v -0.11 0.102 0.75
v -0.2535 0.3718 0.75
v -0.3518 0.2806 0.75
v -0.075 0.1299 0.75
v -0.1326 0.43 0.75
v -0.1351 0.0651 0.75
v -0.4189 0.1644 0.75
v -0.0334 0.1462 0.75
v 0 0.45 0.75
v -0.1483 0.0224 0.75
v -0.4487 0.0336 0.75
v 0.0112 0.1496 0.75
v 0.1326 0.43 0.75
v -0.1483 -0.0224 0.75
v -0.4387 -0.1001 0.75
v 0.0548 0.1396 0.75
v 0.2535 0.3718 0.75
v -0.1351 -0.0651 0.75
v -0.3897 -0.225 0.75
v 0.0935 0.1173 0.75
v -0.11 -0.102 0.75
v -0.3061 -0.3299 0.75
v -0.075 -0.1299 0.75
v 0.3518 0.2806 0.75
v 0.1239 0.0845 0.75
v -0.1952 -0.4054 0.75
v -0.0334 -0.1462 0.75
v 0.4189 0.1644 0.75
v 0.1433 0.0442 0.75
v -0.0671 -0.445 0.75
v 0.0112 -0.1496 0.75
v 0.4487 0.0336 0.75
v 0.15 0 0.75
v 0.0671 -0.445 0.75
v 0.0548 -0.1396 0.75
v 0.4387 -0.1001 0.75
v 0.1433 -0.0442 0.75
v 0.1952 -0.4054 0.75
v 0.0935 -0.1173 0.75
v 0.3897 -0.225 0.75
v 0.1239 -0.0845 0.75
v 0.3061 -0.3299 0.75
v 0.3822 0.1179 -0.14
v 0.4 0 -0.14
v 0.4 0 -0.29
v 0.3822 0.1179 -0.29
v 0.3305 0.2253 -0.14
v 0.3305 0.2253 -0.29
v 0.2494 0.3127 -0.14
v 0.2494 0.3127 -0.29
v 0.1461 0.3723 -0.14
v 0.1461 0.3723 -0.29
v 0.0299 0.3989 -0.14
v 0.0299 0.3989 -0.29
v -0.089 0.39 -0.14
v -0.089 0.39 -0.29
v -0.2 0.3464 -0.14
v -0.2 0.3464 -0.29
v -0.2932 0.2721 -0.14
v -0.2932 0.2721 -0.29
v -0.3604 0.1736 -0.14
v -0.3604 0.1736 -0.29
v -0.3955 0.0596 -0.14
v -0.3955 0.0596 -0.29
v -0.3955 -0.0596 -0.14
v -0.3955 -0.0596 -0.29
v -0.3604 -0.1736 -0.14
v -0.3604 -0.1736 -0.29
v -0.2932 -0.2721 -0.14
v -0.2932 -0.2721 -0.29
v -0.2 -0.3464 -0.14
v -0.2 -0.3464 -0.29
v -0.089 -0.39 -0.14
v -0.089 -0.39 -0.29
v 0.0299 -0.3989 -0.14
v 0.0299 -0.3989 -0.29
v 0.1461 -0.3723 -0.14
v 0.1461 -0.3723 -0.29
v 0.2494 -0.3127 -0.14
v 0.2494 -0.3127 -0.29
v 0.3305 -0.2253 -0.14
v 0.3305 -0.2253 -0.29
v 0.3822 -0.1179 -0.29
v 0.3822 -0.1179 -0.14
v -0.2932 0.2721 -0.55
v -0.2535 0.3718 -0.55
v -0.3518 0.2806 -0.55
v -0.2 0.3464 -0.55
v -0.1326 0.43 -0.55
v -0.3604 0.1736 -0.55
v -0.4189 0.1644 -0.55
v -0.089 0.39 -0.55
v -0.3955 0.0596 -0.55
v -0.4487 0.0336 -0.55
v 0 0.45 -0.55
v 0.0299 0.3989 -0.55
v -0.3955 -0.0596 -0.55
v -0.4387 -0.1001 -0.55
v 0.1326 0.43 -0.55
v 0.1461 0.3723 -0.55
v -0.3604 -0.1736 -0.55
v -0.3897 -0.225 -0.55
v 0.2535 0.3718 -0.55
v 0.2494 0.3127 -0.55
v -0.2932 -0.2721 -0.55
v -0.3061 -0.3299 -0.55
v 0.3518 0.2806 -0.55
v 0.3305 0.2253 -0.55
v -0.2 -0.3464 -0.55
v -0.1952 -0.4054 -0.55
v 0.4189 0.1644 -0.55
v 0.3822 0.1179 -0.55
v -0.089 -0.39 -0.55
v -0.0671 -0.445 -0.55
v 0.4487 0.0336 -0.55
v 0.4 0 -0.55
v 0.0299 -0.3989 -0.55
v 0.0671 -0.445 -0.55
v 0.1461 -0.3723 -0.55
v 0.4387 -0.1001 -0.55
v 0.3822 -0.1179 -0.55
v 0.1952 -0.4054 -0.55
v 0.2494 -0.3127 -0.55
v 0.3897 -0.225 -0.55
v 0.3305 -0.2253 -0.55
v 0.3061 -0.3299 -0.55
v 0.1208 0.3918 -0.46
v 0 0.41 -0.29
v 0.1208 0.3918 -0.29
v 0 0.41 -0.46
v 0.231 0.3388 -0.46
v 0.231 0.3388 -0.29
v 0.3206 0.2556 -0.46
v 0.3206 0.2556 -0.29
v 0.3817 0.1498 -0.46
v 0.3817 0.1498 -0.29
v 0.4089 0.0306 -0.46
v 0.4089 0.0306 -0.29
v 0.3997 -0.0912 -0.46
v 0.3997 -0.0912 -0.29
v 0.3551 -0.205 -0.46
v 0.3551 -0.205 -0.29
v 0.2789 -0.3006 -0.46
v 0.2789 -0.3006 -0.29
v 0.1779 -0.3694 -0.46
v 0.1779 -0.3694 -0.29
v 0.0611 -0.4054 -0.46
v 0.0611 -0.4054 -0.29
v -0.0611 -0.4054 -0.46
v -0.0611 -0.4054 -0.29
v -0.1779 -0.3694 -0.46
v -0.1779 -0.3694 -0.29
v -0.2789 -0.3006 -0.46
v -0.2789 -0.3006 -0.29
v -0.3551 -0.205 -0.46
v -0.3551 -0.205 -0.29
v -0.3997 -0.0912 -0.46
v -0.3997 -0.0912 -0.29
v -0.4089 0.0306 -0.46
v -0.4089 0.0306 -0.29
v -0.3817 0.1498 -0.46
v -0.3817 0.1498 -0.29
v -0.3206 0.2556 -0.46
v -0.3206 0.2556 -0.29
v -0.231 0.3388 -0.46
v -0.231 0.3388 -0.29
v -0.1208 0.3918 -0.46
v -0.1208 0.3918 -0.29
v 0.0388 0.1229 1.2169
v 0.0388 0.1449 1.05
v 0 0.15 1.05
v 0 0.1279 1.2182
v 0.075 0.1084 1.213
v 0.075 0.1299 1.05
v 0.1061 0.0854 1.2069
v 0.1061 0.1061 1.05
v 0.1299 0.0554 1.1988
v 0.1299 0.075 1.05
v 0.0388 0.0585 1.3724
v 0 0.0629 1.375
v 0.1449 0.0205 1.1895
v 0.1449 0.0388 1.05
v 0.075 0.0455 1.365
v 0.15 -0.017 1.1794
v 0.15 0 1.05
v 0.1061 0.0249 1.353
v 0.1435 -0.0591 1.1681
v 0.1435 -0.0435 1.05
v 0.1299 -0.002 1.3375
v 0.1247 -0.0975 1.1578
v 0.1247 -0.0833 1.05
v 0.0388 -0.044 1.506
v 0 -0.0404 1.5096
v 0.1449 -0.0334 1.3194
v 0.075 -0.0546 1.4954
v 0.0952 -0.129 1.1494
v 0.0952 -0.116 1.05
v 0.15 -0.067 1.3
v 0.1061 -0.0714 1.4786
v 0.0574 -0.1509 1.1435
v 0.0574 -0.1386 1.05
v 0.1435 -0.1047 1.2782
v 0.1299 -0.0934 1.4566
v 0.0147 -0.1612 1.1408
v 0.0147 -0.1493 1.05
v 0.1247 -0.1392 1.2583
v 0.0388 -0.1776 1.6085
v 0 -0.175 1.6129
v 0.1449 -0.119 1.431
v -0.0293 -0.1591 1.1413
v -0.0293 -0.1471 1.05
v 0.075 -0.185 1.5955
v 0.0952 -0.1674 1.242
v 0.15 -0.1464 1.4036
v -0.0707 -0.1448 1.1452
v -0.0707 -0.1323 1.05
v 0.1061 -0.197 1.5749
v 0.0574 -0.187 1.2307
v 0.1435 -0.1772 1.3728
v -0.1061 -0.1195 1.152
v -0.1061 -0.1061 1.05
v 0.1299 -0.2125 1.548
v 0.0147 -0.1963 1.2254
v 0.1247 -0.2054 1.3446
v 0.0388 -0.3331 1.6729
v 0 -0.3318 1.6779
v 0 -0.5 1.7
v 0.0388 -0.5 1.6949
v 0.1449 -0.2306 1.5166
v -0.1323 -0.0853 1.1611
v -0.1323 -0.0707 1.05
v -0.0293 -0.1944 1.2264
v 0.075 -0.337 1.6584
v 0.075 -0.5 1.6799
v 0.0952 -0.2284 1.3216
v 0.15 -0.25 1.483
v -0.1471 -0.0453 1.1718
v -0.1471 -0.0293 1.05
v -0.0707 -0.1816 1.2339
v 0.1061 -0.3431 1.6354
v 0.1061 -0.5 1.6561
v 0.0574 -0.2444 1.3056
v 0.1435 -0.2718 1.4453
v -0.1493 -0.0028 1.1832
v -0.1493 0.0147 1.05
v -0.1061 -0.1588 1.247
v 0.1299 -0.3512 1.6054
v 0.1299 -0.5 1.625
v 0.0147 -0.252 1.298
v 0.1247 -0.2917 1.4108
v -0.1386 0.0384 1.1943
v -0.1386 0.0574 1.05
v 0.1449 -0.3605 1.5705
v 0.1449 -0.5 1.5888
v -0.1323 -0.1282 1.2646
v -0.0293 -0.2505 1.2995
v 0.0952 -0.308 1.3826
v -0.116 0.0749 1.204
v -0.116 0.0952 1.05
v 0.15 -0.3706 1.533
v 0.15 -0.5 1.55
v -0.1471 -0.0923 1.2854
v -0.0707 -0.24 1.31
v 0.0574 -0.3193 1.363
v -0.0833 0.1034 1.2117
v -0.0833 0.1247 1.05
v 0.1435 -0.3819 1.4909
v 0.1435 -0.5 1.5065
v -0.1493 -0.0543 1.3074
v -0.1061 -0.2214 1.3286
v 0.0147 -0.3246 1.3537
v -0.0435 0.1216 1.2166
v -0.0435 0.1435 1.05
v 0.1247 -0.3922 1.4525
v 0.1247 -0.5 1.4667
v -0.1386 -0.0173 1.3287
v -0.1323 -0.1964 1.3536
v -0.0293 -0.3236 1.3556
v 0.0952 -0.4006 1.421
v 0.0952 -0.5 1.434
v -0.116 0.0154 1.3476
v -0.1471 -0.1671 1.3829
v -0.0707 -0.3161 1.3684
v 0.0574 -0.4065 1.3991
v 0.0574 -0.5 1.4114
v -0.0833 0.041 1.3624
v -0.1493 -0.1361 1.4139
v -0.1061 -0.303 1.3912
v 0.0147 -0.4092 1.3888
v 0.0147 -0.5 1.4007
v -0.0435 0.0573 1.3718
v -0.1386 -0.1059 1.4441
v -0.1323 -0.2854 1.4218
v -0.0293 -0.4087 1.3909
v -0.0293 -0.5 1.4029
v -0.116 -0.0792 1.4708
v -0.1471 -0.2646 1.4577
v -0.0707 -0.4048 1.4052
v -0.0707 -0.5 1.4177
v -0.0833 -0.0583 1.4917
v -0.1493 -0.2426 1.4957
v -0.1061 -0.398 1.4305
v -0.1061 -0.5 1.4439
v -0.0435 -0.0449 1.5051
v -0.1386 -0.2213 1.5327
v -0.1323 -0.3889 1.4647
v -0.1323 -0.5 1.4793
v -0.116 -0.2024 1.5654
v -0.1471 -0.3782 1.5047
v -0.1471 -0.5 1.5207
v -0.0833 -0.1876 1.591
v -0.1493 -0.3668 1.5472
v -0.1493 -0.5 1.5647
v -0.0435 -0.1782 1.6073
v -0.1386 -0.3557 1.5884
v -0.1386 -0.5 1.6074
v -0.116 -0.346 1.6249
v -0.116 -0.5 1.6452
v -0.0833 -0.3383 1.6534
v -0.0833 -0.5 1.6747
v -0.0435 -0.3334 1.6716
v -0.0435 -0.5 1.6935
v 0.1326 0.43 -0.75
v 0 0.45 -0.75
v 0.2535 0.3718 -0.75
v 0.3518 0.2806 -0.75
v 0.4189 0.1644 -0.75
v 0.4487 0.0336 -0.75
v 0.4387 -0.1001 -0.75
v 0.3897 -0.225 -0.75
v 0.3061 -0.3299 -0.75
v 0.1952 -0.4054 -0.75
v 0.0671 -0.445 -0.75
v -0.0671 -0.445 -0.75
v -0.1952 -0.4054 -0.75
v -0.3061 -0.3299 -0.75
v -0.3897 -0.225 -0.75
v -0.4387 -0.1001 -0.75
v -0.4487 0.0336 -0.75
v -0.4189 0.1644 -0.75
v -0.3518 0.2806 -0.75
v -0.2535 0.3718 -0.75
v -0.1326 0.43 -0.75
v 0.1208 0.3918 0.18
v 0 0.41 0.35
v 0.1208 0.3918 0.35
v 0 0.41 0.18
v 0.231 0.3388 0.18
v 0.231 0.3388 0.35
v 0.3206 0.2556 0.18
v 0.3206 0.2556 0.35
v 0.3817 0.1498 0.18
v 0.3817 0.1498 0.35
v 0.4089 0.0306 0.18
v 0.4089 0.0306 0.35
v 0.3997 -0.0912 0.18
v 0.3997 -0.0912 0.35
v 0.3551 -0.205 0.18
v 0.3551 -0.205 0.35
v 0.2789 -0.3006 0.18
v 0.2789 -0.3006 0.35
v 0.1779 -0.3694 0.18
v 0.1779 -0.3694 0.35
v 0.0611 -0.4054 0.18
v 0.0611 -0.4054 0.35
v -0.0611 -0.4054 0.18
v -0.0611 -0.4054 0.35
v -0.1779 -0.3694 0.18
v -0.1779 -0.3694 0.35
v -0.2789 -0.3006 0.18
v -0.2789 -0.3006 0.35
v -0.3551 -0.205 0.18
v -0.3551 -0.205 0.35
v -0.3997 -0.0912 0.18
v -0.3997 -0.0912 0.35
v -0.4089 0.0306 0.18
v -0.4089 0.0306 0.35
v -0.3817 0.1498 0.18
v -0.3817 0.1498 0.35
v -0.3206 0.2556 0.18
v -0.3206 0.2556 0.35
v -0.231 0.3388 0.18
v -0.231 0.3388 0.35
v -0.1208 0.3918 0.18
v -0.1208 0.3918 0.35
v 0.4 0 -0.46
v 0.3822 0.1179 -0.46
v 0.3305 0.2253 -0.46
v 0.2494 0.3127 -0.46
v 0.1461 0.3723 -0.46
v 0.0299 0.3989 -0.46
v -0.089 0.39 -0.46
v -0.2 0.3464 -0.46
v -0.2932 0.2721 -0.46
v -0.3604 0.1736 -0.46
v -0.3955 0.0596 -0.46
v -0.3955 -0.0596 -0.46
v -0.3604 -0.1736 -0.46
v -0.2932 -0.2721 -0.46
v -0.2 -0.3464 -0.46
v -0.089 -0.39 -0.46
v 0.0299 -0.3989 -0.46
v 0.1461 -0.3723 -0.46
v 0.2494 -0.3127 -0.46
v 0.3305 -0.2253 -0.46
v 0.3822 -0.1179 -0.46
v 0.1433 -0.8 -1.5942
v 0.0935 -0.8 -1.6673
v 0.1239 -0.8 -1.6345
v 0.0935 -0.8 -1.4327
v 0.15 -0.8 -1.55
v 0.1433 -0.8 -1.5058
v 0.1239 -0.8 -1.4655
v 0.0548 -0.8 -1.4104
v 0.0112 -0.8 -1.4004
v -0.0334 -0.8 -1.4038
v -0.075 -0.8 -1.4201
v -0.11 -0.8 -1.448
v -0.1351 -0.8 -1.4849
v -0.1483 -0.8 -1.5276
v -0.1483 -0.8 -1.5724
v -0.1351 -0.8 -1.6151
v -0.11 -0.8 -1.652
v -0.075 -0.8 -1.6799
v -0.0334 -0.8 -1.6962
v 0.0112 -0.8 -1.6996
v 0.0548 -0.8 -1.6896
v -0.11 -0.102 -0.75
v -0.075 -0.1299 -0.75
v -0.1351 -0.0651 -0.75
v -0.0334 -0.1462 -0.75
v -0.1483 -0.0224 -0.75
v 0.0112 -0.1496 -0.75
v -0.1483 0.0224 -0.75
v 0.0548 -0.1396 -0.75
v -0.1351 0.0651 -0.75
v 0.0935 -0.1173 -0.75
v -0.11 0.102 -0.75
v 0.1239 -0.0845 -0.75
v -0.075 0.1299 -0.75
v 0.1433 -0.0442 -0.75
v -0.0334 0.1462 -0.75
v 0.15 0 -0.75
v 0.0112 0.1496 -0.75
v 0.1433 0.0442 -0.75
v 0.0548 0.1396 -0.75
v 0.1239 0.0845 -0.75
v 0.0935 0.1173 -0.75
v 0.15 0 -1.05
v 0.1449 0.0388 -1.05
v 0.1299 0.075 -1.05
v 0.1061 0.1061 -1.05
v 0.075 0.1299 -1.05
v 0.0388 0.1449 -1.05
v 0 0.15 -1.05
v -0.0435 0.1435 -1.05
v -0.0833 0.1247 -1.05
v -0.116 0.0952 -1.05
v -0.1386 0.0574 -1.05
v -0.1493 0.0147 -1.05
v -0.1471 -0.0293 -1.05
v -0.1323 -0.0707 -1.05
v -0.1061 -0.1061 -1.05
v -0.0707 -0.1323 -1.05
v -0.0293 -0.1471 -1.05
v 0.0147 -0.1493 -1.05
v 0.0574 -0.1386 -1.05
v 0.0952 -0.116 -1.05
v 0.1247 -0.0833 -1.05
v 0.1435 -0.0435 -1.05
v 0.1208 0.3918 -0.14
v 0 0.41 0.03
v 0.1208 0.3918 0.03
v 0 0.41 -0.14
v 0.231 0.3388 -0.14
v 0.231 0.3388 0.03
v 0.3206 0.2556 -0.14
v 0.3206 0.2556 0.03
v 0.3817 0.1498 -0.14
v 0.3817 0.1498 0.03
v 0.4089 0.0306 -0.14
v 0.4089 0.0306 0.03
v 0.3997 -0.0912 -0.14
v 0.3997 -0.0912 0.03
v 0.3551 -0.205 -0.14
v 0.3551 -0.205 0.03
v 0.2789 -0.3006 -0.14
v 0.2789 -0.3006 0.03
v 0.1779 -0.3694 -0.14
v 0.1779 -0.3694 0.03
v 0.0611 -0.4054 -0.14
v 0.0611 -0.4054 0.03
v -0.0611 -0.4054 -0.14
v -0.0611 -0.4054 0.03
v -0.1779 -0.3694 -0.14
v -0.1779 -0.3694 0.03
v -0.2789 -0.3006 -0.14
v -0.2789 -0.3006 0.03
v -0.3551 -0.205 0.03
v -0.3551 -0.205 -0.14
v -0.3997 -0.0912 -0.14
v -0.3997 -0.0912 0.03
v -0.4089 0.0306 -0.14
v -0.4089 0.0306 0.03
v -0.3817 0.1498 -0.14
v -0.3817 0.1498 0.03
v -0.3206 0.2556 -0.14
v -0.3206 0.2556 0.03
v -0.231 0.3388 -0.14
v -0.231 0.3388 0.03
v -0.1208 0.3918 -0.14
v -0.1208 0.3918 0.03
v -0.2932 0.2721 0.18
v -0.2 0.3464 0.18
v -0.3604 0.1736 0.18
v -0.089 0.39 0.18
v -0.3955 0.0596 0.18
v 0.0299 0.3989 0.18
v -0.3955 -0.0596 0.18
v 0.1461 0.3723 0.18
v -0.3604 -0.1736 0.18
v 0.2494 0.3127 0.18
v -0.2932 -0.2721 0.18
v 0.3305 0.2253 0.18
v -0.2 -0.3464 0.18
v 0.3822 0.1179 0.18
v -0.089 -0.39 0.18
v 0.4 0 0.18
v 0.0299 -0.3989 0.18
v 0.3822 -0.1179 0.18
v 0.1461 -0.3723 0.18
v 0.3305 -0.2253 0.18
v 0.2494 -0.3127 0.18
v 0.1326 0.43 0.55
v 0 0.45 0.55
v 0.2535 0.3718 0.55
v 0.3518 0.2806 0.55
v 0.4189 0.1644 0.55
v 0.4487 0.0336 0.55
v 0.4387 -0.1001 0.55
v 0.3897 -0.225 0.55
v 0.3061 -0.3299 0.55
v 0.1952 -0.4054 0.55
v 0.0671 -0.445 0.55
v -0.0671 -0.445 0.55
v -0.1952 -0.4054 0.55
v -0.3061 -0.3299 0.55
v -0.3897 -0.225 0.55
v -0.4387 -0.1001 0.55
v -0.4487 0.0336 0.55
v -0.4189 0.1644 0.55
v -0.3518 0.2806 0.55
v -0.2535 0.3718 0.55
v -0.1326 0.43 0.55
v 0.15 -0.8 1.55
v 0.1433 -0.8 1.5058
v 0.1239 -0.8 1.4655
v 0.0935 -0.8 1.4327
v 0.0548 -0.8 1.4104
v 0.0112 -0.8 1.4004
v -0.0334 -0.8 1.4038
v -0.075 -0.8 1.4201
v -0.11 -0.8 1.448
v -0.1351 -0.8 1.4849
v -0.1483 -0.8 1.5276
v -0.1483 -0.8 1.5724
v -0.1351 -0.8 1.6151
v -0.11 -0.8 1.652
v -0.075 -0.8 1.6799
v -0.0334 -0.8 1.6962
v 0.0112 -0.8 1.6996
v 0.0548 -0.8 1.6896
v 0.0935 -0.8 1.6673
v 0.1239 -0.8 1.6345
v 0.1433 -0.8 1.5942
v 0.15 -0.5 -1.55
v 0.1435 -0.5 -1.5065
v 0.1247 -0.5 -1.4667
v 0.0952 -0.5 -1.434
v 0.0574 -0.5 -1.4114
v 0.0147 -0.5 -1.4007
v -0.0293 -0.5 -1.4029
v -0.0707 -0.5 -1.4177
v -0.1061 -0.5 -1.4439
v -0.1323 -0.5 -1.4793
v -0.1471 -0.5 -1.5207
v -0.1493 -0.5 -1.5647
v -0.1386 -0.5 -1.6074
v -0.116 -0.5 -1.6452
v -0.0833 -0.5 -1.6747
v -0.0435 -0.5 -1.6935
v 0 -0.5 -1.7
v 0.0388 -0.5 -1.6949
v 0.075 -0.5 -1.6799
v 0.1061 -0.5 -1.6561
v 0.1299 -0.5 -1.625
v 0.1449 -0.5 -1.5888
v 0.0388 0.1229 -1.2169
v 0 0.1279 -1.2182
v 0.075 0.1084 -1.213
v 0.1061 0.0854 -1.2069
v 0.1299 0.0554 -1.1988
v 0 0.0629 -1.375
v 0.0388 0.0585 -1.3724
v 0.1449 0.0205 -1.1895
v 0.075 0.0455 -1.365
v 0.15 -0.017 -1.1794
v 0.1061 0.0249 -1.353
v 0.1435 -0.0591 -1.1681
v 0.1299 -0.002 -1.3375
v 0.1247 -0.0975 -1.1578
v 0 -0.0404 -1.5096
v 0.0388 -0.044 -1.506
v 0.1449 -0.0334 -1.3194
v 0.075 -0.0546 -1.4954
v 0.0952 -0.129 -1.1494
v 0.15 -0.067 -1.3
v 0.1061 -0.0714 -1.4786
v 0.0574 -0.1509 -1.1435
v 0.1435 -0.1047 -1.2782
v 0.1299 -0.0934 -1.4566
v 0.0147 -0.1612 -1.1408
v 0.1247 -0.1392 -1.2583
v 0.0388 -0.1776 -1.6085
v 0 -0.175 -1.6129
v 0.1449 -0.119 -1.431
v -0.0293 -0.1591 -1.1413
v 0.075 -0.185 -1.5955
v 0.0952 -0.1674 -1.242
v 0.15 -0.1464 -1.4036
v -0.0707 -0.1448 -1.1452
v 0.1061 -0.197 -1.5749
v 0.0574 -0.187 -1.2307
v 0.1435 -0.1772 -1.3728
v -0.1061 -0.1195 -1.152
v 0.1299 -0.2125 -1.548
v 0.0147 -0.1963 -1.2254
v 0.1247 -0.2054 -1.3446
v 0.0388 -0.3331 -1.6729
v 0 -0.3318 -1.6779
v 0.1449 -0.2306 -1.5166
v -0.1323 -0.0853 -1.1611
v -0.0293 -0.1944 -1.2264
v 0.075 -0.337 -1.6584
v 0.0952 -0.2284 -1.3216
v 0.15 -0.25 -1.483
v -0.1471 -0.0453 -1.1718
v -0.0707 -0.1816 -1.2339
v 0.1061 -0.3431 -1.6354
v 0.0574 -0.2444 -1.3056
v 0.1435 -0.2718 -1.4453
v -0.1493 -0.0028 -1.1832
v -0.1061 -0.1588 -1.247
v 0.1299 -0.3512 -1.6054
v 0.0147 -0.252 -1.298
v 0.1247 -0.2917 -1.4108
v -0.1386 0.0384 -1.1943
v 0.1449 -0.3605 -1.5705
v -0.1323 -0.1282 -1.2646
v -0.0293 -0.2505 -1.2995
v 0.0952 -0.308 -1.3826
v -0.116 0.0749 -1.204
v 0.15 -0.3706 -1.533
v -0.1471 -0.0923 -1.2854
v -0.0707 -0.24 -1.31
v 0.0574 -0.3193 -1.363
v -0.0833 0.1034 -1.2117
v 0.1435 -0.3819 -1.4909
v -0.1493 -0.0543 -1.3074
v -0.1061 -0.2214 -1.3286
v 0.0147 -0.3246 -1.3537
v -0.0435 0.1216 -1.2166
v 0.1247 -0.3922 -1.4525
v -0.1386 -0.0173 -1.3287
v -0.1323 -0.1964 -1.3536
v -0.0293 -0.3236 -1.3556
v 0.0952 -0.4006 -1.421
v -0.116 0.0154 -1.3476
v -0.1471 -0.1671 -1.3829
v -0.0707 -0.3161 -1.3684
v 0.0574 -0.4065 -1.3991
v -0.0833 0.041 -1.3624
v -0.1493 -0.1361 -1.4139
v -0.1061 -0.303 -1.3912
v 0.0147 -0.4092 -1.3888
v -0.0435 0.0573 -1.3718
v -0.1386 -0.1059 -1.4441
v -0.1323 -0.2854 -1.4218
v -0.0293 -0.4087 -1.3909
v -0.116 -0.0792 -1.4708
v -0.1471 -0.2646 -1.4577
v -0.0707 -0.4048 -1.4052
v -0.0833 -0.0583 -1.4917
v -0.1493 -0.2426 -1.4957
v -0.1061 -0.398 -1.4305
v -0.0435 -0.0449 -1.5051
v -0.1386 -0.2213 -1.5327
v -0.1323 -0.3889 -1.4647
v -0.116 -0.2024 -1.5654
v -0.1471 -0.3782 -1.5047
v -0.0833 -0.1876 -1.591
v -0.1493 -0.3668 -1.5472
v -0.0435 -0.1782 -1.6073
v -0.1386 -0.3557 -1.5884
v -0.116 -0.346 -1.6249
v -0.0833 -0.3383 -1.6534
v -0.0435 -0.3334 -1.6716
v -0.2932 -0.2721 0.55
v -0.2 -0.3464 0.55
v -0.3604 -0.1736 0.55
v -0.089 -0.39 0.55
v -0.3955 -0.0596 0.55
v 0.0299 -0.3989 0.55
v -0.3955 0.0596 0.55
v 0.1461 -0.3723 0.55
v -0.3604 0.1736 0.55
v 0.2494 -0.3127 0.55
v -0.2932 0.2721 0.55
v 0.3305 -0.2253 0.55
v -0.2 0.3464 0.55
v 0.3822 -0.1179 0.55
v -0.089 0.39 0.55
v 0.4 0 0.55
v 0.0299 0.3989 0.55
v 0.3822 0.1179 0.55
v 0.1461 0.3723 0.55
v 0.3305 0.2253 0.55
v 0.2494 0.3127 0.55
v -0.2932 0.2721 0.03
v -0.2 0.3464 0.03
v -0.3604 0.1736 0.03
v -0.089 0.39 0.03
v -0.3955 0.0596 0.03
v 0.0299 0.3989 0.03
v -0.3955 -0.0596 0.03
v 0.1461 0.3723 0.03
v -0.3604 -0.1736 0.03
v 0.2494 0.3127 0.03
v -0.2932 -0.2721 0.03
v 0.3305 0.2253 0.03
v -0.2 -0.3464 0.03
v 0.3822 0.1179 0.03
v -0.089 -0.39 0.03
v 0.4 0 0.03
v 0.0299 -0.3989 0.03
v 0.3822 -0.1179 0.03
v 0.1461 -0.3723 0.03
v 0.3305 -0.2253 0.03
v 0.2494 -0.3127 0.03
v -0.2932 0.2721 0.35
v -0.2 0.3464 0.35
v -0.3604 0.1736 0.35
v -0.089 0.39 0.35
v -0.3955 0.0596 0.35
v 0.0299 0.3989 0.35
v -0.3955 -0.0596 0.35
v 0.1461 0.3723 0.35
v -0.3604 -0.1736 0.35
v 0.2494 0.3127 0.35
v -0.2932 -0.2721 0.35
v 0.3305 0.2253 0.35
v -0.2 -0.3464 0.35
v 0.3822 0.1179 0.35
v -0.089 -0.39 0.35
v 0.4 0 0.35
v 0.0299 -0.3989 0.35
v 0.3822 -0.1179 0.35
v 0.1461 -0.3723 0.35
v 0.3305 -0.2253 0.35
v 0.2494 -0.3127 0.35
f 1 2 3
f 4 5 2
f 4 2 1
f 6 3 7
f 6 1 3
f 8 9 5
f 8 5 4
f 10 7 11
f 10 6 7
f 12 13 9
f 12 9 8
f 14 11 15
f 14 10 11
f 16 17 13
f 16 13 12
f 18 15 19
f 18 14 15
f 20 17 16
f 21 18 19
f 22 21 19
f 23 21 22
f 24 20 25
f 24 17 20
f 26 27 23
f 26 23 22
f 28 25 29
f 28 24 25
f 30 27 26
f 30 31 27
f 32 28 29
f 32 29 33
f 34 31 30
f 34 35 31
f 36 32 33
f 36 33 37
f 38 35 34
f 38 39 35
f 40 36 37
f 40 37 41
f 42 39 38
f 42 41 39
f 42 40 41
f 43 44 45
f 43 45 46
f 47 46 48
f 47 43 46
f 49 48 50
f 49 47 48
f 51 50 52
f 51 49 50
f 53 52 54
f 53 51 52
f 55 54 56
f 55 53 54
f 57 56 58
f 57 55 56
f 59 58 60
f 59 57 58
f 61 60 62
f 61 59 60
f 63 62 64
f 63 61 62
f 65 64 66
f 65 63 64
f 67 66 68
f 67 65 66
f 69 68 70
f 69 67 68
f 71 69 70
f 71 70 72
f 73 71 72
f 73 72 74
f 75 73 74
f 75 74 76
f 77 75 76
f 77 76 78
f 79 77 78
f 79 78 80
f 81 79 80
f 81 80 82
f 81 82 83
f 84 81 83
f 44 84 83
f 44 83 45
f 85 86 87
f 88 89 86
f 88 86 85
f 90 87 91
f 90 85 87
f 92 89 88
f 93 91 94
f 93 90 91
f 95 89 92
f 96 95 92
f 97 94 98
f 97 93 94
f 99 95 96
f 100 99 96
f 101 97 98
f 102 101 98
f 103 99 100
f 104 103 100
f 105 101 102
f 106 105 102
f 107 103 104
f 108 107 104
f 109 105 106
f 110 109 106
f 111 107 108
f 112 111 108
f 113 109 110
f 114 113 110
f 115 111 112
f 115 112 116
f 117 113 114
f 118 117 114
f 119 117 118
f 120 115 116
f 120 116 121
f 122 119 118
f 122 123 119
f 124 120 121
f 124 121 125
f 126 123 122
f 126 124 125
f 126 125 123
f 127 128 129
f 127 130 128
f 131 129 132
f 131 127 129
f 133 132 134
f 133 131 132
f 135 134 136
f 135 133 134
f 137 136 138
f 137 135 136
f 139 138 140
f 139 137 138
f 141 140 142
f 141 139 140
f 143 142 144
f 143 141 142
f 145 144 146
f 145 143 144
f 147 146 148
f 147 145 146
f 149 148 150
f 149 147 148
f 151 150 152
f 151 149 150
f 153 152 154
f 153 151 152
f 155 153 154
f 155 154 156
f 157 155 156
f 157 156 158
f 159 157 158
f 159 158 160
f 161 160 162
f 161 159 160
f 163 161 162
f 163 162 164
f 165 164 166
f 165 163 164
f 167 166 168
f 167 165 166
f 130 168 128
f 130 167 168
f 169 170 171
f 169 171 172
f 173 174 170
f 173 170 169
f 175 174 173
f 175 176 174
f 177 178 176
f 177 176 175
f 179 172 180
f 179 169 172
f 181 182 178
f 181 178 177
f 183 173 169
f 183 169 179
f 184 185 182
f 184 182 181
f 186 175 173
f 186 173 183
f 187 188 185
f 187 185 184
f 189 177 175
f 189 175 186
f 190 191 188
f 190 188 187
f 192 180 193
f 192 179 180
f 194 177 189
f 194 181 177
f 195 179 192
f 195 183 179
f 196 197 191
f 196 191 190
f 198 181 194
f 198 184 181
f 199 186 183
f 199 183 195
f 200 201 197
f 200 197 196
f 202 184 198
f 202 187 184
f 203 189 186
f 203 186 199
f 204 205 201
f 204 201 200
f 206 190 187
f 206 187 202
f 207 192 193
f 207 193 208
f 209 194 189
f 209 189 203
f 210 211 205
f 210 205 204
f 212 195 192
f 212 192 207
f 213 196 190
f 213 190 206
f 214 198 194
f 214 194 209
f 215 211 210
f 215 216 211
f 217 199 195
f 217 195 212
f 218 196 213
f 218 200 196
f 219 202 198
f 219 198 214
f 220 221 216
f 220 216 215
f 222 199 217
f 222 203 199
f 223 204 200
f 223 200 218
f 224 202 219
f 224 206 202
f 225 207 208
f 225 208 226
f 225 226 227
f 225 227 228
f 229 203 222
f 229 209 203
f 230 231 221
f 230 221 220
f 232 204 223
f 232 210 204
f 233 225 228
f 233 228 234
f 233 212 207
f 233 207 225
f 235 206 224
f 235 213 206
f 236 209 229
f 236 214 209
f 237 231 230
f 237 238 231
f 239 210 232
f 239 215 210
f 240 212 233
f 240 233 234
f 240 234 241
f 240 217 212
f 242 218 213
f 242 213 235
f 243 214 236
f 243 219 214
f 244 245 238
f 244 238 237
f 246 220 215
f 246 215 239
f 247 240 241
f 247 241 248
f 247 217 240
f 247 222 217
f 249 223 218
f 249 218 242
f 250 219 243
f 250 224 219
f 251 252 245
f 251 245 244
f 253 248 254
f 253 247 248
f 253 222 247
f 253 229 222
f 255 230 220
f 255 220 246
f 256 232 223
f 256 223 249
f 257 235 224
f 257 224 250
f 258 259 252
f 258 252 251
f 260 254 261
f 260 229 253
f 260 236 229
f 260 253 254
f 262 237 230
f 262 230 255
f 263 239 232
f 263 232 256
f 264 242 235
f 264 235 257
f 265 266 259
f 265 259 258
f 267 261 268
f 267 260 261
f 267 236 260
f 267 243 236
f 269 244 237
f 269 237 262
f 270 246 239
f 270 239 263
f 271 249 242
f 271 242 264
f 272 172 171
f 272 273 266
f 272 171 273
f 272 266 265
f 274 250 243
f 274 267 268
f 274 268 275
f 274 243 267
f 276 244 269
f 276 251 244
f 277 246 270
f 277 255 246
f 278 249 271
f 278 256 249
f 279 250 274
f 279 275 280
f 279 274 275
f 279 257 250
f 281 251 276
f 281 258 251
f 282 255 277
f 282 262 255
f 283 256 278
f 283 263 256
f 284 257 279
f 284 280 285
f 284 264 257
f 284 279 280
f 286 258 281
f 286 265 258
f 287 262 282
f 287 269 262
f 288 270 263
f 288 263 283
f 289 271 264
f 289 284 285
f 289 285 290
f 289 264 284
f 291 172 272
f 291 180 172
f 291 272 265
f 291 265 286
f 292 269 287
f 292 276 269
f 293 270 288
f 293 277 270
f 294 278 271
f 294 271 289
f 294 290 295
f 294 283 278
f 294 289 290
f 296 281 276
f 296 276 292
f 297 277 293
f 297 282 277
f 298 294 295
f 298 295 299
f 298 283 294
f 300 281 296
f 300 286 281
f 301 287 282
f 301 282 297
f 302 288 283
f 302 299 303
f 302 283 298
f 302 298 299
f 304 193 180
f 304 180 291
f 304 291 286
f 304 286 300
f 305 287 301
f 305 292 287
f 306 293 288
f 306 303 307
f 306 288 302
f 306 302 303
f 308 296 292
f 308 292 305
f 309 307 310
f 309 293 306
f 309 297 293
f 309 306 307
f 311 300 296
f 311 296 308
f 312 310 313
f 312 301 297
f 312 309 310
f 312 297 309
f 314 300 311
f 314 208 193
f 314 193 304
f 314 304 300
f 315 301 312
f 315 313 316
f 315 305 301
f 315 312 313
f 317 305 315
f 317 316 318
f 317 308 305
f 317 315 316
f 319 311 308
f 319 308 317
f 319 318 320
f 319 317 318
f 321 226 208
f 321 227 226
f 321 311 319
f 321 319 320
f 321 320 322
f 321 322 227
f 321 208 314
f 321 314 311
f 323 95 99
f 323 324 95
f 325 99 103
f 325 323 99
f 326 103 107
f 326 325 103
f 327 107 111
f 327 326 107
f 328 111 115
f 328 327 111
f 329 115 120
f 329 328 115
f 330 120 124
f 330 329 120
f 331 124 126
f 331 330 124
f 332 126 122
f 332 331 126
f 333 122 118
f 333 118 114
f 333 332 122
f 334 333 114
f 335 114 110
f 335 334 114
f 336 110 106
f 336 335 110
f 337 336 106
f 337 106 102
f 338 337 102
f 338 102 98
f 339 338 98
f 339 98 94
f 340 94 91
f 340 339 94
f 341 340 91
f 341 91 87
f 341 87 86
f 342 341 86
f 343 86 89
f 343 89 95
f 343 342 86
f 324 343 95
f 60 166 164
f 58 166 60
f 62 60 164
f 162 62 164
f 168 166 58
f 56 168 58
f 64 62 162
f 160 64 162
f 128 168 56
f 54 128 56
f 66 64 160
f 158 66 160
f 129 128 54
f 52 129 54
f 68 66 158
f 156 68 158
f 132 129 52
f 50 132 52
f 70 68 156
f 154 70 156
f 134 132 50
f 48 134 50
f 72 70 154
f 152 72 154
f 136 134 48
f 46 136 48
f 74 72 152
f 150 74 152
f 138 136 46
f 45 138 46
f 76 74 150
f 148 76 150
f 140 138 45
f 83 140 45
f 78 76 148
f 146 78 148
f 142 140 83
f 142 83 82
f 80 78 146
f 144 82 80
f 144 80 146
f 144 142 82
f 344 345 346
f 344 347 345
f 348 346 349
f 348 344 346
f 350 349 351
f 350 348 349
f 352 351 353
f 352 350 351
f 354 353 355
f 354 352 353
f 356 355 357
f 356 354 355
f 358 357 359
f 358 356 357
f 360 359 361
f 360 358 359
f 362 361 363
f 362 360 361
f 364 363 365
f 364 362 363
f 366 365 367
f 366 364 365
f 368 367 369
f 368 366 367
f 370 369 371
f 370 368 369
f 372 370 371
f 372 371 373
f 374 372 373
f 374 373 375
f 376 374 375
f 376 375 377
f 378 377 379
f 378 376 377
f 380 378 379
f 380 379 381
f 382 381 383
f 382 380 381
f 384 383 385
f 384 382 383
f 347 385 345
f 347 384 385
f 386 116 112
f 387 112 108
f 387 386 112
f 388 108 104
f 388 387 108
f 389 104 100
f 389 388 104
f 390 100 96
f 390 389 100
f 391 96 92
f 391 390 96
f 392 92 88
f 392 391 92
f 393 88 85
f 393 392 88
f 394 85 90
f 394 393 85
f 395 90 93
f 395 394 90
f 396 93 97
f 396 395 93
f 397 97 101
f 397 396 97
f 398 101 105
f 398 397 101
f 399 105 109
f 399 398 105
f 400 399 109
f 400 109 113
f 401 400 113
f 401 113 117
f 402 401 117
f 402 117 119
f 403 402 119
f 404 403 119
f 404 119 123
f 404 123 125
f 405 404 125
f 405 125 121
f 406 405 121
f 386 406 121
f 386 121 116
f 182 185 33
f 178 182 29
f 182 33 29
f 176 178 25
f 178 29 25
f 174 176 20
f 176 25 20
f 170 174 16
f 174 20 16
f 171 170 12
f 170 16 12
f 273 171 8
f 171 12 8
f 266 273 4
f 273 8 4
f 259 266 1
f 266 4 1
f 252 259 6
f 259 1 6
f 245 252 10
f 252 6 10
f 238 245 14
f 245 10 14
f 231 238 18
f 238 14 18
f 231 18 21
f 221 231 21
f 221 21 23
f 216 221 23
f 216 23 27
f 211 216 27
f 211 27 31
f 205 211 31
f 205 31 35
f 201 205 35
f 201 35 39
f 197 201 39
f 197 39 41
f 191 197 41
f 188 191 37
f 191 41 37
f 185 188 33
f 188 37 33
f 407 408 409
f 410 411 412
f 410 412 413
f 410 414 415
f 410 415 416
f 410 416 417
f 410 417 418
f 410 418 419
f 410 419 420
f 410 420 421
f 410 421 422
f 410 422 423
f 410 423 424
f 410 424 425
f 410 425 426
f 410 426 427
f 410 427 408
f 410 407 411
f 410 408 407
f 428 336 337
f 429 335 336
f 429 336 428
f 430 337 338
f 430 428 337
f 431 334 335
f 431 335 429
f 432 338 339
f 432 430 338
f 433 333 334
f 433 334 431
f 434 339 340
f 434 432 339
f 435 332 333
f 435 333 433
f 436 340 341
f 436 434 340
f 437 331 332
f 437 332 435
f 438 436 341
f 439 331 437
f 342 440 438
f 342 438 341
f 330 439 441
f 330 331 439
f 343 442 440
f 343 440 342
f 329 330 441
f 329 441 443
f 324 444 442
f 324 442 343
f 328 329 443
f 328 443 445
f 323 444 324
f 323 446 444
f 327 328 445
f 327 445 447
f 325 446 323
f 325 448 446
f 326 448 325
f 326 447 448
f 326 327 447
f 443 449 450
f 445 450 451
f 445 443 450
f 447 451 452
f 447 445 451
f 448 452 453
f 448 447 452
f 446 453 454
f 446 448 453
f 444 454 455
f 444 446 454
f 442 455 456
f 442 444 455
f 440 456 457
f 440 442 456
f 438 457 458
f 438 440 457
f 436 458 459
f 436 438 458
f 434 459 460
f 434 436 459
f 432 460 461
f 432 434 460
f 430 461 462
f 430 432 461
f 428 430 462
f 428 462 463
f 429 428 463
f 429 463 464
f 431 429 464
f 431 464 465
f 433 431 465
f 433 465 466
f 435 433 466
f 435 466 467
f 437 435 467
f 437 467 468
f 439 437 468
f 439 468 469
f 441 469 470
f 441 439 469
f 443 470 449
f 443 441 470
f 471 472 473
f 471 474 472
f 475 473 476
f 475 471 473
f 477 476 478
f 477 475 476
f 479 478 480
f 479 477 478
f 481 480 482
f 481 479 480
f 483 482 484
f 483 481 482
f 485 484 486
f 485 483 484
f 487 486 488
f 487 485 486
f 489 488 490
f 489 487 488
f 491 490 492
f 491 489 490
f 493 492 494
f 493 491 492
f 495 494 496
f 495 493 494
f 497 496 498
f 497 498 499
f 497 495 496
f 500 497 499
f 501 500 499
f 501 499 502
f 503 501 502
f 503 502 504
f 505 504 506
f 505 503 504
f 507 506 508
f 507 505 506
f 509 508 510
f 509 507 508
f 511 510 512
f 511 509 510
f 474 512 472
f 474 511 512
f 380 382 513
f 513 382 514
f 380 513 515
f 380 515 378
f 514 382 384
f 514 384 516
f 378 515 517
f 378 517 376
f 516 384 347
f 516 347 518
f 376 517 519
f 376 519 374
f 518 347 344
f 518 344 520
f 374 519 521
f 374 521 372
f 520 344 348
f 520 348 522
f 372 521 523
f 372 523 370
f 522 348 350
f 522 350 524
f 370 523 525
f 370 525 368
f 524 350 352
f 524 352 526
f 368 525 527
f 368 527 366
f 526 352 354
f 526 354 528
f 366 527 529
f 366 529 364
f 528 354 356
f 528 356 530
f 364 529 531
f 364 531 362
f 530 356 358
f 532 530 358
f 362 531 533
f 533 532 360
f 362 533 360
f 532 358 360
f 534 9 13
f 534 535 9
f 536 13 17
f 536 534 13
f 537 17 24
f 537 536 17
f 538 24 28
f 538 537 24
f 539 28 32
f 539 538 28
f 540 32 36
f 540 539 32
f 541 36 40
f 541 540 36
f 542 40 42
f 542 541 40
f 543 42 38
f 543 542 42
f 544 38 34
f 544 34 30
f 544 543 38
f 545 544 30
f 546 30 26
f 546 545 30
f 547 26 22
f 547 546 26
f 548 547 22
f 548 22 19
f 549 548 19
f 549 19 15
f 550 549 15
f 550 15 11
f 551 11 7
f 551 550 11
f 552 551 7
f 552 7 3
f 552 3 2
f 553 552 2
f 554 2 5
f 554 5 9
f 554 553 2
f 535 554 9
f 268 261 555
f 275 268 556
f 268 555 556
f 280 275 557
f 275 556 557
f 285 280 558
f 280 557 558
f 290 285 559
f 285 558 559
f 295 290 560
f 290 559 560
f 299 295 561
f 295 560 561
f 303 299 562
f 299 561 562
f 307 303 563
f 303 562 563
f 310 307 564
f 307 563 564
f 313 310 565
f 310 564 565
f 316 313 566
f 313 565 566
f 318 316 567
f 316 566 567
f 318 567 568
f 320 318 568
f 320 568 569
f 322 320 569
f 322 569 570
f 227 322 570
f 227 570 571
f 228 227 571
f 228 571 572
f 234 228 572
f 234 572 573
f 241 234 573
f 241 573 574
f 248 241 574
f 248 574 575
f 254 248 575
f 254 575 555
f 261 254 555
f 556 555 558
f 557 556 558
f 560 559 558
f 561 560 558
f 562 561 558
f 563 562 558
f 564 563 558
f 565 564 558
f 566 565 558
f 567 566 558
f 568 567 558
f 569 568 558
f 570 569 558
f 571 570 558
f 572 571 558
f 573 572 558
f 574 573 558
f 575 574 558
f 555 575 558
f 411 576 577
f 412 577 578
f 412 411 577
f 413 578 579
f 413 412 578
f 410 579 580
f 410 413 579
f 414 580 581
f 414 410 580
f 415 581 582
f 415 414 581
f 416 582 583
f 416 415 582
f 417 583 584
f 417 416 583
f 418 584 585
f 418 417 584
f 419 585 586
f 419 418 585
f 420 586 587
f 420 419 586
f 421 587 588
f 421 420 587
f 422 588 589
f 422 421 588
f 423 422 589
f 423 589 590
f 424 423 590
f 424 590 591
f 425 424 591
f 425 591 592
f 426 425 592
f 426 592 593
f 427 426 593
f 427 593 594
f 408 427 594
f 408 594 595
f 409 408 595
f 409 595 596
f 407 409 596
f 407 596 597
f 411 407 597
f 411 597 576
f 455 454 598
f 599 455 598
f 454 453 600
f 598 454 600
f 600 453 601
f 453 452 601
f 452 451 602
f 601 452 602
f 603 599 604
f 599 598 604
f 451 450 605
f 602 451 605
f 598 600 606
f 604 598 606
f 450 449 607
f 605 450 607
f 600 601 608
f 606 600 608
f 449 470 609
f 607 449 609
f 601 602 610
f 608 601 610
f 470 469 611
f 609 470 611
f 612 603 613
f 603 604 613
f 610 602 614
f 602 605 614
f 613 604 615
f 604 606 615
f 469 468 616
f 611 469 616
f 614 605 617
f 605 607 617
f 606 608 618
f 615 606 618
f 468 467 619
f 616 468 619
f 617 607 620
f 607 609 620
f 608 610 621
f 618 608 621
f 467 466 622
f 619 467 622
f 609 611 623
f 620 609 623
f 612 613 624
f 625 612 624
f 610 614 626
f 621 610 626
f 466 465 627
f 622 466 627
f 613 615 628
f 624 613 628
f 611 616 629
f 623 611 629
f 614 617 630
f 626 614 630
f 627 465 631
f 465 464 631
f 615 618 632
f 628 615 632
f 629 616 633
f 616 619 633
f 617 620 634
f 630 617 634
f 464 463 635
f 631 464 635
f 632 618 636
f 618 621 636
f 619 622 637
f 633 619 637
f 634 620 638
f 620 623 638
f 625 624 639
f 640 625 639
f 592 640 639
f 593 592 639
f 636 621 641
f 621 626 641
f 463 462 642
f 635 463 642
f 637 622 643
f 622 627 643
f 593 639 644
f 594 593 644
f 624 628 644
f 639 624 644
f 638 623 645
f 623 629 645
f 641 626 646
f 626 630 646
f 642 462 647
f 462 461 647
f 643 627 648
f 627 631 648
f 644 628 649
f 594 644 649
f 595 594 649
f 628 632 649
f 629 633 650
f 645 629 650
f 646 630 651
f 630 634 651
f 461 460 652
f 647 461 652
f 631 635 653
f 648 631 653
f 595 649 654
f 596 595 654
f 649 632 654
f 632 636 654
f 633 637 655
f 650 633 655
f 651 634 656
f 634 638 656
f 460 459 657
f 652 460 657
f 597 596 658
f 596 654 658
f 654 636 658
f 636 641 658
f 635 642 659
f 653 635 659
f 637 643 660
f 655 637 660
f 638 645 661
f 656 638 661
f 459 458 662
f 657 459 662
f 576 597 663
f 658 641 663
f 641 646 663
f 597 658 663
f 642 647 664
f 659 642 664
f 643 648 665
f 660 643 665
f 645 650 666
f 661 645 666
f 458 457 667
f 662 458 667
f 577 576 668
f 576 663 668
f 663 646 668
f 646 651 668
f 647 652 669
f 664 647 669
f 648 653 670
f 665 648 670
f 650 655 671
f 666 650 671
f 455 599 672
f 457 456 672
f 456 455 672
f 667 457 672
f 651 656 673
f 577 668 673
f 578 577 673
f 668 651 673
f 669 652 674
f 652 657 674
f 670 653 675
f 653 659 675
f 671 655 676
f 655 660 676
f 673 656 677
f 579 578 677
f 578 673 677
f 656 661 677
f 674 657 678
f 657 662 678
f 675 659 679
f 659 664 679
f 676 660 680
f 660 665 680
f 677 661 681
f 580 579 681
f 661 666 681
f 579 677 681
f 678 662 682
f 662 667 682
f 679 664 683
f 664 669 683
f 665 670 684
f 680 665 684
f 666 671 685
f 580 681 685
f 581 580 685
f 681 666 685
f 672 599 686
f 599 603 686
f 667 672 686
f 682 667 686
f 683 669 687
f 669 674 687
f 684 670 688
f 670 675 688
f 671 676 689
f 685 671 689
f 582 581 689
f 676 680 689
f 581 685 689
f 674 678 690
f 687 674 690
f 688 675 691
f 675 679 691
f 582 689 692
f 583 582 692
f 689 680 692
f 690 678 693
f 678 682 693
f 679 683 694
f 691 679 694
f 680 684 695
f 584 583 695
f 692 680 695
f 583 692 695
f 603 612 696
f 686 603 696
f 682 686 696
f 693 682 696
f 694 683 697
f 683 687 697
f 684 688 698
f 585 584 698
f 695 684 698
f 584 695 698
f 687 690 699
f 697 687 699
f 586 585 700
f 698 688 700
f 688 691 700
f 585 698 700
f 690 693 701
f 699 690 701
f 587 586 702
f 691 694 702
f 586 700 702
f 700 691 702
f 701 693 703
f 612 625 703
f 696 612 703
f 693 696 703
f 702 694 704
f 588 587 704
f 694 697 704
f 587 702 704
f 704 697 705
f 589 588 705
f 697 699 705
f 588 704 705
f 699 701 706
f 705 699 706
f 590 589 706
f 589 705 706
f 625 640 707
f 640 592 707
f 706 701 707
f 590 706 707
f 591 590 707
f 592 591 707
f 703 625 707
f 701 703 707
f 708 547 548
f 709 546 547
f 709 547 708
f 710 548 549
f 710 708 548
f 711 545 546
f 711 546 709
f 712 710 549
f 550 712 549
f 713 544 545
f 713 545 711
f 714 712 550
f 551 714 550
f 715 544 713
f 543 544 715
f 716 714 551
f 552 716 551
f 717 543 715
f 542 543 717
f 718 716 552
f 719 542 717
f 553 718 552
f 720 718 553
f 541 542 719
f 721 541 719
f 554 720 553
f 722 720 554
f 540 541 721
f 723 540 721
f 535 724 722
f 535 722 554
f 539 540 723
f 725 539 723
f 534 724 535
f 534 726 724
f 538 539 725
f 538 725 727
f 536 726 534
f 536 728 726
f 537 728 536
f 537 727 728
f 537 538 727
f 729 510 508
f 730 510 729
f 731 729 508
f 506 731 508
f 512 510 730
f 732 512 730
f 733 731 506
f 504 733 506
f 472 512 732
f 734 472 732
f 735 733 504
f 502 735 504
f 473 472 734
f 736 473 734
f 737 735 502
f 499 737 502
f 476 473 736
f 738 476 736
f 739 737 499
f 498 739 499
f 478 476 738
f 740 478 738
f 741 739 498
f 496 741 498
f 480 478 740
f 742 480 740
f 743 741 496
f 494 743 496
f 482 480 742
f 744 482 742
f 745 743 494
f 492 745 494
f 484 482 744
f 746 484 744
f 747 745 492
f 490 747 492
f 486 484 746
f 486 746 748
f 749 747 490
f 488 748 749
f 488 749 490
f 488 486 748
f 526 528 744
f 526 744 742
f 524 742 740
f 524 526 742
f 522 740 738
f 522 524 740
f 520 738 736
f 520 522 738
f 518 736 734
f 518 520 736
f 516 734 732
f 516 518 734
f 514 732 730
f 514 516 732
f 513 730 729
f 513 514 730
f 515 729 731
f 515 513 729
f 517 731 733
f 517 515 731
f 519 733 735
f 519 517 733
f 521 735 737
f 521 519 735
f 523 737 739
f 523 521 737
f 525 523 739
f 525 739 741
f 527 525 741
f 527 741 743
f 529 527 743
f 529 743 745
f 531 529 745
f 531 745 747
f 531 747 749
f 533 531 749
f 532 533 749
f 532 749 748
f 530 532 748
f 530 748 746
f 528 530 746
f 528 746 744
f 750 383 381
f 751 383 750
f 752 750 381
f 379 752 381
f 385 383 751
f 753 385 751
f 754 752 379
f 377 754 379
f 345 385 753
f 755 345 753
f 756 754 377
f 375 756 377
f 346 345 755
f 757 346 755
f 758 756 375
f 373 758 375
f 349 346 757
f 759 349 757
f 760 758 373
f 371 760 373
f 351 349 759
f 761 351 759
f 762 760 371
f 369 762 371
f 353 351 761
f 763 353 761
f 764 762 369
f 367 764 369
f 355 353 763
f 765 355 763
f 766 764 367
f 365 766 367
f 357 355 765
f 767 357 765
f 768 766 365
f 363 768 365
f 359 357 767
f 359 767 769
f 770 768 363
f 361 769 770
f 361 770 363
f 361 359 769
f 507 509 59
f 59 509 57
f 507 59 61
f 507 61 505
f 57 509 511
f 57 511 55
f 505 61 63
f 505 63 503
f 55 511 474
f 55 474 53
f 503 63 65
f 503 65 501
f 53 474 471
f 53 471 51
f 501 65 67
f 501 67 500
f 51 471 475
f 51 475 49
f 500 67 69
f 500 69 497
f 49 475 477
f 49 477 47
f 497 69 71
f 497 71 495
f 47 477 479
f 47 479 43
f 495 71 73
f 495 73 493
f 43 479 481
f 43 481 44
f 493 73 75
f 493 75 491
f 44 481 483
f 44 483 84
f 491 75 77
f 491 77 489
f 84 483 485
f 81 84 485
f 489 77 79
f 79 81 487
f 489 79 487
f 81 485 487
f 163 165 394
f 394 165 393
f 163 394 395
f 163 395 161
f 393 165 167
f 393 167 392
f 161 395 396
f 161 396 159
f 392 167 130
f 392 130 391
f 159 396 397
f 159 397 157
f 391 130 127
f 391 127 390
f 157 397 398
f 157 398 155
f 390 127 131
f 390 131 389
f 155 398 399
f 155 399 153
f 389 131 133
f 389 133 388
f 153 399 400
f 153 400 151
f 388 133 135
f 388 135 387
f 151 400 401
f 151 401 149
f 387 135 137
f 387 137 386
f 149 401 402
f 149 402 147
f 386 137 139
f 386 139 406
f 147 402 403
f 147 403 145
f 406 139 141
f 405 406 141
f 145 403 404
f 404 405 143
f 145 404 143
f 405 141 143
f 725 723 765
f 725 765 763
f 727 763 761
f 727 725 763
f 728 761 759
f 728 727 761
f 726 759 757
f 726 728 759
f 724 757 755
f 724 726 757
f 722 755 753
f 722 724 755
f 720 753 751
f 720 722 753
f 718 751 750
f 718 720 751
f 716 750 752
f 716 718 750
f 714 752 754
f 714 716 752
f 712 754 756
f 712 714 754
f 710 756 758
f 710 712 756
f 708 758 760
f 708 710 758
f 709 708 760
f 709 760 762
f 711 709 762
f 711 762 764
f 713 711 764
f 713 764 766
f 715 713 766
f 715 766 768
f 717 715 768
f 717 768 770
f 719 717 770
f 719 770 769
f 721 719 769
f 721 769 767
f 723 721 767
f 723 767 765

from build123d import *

# Parameters (mm, degrees)
ESBO_O1_R                = 0.4
RESSALTO_EXTRUS_O1_DEPTH = 0.75
VARREDURA1_OUTLINE_R     = 0.15
VARREDURA1_ANGLE         = 90
VARREDURA1_2_OUTLINE_R   = 0.15
VARREDURA1_2_DEPTH       = 1.0500001
VARREDURA1_START         = -0.8
VARREDURA1_3_OUTLINE_R   = 0.15
VARREDURA1_3_DEPTH       = 0.3000001
ESBO_O8_W                = 0.17
ESBO_O8_H                = 0.41
ESBO_O9_W                = 0.17
ESBO_O9_H                = 0.41
ESBO_O10_W               = 0.17
ESBO_O10_H               = 0.41


with BuildPart() as part:
    # Esboço1 → Ressalto-extrusão1 (new, symmetric)
    with BuildSketch(Plane.XY):
        Circle(ESBO_O1_R)
    extrude(amount=RESSALTO_EXTRUS_O1_DEPTH, both=True)



with BuildPart() as body_2:
    # Varredura1: read off the stored shape, not the designer's step
    # Varredura1 outline → Varredura1 (revolve)
    with BuildSketch(Plane(origin=(0, -0.5, 1.05), x_dir=(0, 1, 0), z_dir=(0, 0, -1))):
        with Locations((0.5, 0)):
            Circle(VARREDURA1_OUTLINE_R)
    varredura1 = revolve(axis=Axis((0, -0.5, 1.05), (1, 0, 0)), revolution_arc=VARREDURA1_ANGLE)


with BuildPart() as part_1:
    add(part.part)

    add(body_2.part)  # Varredura1 2 merges body 2
    # Varredura1 2 outline → Varredura1 2 (add)
    with BuildSketch(Plane.XY):
        Circle(VARREDURA1_2_OUTLINE_R)
    varredura1_2 = extrude(amount=VARREDURA1_2_DEPTH)

    # Varredura1 3 outline → Varredura1 3 (add)
    with BuildSketch(Plane(origin=(0, 0, 0), x_dir=(1, 0, 0), z_dir=(0, 1, 0)).offset(VARREDURA1_START)):
        with Locations((0, -1.55)):
            Circle(VARREDURA1_3_OUTLINE_R)
    varredura1_3 = extrude(amount=VARREDURA1_3_DEPTH)

    # Espelhar1: Varredura1, Varredura1 2, Varredura1 3 across plane
    add(varredura1.mirror(Plane.XY))
    add(varredura1_2.mirror(Plane.XY))
    add(varredura1_3.mirror(Plane.XY))

    # Esboço7 → Revolução1 (revolve)
    with BuildSketch(Plane(origin=(0, 0, 0), x_dir=(0, 0, -1), z_dir=(1, 0, 0))):
        Polygon((-0.75, 0), (-0.75, 0.45), (-0.55, 0.45), (-0.55, 0.4), (0.55, 0.4), (0.55, 0.45), (0.75, 0.45), (0.75, 0), align=None)
    revolve(axis=Axis((0, 0, 1.953006301), (0, 0, -1)))

    # Esboço8 → Revolução2 (revolve)
    with BuildSketch(Plane(origin=(0, 0, 0), x_dir=(0, 0, -1), z_dir=(1, 0, 0))):
        with Locations((-0.265, 0.205)):
            Rectangle(ESBO_O8_W, ESBO_O8_H)
    revolve(axis=Axis((0, 0, 1.915551386), (0, 0, -1)))

    # Esboço9 → Revolução3 (revolve)
    with BuildSketch(Plane(origin=(0, 0, 0), x_dir=(0, 0, -1), z_dir=(1, 0, 0))):
        with Locations((0.055, 0.205)):
            Rectangle(ESBO_O9_W, ESBO_O9_H)
    revolve(axis=Axis((0, 0, 1.839950085), (0, 0, -1)))

    # Esboço10 → Revolução4 (revolve)
    with BuildSketch(Plane(origin=(0, 0, 0), x_dir=(0, 0, -1), z_dir=(1, 0, 0))):
        with Locations((0.375, 0.205)):
            Rectangle(ESBO_O10_W, ESBO_O10_H)
    revolve(axis=Axis((0, 0, 1.854283933), (0, 0, -1)))


solid = part_1.part
